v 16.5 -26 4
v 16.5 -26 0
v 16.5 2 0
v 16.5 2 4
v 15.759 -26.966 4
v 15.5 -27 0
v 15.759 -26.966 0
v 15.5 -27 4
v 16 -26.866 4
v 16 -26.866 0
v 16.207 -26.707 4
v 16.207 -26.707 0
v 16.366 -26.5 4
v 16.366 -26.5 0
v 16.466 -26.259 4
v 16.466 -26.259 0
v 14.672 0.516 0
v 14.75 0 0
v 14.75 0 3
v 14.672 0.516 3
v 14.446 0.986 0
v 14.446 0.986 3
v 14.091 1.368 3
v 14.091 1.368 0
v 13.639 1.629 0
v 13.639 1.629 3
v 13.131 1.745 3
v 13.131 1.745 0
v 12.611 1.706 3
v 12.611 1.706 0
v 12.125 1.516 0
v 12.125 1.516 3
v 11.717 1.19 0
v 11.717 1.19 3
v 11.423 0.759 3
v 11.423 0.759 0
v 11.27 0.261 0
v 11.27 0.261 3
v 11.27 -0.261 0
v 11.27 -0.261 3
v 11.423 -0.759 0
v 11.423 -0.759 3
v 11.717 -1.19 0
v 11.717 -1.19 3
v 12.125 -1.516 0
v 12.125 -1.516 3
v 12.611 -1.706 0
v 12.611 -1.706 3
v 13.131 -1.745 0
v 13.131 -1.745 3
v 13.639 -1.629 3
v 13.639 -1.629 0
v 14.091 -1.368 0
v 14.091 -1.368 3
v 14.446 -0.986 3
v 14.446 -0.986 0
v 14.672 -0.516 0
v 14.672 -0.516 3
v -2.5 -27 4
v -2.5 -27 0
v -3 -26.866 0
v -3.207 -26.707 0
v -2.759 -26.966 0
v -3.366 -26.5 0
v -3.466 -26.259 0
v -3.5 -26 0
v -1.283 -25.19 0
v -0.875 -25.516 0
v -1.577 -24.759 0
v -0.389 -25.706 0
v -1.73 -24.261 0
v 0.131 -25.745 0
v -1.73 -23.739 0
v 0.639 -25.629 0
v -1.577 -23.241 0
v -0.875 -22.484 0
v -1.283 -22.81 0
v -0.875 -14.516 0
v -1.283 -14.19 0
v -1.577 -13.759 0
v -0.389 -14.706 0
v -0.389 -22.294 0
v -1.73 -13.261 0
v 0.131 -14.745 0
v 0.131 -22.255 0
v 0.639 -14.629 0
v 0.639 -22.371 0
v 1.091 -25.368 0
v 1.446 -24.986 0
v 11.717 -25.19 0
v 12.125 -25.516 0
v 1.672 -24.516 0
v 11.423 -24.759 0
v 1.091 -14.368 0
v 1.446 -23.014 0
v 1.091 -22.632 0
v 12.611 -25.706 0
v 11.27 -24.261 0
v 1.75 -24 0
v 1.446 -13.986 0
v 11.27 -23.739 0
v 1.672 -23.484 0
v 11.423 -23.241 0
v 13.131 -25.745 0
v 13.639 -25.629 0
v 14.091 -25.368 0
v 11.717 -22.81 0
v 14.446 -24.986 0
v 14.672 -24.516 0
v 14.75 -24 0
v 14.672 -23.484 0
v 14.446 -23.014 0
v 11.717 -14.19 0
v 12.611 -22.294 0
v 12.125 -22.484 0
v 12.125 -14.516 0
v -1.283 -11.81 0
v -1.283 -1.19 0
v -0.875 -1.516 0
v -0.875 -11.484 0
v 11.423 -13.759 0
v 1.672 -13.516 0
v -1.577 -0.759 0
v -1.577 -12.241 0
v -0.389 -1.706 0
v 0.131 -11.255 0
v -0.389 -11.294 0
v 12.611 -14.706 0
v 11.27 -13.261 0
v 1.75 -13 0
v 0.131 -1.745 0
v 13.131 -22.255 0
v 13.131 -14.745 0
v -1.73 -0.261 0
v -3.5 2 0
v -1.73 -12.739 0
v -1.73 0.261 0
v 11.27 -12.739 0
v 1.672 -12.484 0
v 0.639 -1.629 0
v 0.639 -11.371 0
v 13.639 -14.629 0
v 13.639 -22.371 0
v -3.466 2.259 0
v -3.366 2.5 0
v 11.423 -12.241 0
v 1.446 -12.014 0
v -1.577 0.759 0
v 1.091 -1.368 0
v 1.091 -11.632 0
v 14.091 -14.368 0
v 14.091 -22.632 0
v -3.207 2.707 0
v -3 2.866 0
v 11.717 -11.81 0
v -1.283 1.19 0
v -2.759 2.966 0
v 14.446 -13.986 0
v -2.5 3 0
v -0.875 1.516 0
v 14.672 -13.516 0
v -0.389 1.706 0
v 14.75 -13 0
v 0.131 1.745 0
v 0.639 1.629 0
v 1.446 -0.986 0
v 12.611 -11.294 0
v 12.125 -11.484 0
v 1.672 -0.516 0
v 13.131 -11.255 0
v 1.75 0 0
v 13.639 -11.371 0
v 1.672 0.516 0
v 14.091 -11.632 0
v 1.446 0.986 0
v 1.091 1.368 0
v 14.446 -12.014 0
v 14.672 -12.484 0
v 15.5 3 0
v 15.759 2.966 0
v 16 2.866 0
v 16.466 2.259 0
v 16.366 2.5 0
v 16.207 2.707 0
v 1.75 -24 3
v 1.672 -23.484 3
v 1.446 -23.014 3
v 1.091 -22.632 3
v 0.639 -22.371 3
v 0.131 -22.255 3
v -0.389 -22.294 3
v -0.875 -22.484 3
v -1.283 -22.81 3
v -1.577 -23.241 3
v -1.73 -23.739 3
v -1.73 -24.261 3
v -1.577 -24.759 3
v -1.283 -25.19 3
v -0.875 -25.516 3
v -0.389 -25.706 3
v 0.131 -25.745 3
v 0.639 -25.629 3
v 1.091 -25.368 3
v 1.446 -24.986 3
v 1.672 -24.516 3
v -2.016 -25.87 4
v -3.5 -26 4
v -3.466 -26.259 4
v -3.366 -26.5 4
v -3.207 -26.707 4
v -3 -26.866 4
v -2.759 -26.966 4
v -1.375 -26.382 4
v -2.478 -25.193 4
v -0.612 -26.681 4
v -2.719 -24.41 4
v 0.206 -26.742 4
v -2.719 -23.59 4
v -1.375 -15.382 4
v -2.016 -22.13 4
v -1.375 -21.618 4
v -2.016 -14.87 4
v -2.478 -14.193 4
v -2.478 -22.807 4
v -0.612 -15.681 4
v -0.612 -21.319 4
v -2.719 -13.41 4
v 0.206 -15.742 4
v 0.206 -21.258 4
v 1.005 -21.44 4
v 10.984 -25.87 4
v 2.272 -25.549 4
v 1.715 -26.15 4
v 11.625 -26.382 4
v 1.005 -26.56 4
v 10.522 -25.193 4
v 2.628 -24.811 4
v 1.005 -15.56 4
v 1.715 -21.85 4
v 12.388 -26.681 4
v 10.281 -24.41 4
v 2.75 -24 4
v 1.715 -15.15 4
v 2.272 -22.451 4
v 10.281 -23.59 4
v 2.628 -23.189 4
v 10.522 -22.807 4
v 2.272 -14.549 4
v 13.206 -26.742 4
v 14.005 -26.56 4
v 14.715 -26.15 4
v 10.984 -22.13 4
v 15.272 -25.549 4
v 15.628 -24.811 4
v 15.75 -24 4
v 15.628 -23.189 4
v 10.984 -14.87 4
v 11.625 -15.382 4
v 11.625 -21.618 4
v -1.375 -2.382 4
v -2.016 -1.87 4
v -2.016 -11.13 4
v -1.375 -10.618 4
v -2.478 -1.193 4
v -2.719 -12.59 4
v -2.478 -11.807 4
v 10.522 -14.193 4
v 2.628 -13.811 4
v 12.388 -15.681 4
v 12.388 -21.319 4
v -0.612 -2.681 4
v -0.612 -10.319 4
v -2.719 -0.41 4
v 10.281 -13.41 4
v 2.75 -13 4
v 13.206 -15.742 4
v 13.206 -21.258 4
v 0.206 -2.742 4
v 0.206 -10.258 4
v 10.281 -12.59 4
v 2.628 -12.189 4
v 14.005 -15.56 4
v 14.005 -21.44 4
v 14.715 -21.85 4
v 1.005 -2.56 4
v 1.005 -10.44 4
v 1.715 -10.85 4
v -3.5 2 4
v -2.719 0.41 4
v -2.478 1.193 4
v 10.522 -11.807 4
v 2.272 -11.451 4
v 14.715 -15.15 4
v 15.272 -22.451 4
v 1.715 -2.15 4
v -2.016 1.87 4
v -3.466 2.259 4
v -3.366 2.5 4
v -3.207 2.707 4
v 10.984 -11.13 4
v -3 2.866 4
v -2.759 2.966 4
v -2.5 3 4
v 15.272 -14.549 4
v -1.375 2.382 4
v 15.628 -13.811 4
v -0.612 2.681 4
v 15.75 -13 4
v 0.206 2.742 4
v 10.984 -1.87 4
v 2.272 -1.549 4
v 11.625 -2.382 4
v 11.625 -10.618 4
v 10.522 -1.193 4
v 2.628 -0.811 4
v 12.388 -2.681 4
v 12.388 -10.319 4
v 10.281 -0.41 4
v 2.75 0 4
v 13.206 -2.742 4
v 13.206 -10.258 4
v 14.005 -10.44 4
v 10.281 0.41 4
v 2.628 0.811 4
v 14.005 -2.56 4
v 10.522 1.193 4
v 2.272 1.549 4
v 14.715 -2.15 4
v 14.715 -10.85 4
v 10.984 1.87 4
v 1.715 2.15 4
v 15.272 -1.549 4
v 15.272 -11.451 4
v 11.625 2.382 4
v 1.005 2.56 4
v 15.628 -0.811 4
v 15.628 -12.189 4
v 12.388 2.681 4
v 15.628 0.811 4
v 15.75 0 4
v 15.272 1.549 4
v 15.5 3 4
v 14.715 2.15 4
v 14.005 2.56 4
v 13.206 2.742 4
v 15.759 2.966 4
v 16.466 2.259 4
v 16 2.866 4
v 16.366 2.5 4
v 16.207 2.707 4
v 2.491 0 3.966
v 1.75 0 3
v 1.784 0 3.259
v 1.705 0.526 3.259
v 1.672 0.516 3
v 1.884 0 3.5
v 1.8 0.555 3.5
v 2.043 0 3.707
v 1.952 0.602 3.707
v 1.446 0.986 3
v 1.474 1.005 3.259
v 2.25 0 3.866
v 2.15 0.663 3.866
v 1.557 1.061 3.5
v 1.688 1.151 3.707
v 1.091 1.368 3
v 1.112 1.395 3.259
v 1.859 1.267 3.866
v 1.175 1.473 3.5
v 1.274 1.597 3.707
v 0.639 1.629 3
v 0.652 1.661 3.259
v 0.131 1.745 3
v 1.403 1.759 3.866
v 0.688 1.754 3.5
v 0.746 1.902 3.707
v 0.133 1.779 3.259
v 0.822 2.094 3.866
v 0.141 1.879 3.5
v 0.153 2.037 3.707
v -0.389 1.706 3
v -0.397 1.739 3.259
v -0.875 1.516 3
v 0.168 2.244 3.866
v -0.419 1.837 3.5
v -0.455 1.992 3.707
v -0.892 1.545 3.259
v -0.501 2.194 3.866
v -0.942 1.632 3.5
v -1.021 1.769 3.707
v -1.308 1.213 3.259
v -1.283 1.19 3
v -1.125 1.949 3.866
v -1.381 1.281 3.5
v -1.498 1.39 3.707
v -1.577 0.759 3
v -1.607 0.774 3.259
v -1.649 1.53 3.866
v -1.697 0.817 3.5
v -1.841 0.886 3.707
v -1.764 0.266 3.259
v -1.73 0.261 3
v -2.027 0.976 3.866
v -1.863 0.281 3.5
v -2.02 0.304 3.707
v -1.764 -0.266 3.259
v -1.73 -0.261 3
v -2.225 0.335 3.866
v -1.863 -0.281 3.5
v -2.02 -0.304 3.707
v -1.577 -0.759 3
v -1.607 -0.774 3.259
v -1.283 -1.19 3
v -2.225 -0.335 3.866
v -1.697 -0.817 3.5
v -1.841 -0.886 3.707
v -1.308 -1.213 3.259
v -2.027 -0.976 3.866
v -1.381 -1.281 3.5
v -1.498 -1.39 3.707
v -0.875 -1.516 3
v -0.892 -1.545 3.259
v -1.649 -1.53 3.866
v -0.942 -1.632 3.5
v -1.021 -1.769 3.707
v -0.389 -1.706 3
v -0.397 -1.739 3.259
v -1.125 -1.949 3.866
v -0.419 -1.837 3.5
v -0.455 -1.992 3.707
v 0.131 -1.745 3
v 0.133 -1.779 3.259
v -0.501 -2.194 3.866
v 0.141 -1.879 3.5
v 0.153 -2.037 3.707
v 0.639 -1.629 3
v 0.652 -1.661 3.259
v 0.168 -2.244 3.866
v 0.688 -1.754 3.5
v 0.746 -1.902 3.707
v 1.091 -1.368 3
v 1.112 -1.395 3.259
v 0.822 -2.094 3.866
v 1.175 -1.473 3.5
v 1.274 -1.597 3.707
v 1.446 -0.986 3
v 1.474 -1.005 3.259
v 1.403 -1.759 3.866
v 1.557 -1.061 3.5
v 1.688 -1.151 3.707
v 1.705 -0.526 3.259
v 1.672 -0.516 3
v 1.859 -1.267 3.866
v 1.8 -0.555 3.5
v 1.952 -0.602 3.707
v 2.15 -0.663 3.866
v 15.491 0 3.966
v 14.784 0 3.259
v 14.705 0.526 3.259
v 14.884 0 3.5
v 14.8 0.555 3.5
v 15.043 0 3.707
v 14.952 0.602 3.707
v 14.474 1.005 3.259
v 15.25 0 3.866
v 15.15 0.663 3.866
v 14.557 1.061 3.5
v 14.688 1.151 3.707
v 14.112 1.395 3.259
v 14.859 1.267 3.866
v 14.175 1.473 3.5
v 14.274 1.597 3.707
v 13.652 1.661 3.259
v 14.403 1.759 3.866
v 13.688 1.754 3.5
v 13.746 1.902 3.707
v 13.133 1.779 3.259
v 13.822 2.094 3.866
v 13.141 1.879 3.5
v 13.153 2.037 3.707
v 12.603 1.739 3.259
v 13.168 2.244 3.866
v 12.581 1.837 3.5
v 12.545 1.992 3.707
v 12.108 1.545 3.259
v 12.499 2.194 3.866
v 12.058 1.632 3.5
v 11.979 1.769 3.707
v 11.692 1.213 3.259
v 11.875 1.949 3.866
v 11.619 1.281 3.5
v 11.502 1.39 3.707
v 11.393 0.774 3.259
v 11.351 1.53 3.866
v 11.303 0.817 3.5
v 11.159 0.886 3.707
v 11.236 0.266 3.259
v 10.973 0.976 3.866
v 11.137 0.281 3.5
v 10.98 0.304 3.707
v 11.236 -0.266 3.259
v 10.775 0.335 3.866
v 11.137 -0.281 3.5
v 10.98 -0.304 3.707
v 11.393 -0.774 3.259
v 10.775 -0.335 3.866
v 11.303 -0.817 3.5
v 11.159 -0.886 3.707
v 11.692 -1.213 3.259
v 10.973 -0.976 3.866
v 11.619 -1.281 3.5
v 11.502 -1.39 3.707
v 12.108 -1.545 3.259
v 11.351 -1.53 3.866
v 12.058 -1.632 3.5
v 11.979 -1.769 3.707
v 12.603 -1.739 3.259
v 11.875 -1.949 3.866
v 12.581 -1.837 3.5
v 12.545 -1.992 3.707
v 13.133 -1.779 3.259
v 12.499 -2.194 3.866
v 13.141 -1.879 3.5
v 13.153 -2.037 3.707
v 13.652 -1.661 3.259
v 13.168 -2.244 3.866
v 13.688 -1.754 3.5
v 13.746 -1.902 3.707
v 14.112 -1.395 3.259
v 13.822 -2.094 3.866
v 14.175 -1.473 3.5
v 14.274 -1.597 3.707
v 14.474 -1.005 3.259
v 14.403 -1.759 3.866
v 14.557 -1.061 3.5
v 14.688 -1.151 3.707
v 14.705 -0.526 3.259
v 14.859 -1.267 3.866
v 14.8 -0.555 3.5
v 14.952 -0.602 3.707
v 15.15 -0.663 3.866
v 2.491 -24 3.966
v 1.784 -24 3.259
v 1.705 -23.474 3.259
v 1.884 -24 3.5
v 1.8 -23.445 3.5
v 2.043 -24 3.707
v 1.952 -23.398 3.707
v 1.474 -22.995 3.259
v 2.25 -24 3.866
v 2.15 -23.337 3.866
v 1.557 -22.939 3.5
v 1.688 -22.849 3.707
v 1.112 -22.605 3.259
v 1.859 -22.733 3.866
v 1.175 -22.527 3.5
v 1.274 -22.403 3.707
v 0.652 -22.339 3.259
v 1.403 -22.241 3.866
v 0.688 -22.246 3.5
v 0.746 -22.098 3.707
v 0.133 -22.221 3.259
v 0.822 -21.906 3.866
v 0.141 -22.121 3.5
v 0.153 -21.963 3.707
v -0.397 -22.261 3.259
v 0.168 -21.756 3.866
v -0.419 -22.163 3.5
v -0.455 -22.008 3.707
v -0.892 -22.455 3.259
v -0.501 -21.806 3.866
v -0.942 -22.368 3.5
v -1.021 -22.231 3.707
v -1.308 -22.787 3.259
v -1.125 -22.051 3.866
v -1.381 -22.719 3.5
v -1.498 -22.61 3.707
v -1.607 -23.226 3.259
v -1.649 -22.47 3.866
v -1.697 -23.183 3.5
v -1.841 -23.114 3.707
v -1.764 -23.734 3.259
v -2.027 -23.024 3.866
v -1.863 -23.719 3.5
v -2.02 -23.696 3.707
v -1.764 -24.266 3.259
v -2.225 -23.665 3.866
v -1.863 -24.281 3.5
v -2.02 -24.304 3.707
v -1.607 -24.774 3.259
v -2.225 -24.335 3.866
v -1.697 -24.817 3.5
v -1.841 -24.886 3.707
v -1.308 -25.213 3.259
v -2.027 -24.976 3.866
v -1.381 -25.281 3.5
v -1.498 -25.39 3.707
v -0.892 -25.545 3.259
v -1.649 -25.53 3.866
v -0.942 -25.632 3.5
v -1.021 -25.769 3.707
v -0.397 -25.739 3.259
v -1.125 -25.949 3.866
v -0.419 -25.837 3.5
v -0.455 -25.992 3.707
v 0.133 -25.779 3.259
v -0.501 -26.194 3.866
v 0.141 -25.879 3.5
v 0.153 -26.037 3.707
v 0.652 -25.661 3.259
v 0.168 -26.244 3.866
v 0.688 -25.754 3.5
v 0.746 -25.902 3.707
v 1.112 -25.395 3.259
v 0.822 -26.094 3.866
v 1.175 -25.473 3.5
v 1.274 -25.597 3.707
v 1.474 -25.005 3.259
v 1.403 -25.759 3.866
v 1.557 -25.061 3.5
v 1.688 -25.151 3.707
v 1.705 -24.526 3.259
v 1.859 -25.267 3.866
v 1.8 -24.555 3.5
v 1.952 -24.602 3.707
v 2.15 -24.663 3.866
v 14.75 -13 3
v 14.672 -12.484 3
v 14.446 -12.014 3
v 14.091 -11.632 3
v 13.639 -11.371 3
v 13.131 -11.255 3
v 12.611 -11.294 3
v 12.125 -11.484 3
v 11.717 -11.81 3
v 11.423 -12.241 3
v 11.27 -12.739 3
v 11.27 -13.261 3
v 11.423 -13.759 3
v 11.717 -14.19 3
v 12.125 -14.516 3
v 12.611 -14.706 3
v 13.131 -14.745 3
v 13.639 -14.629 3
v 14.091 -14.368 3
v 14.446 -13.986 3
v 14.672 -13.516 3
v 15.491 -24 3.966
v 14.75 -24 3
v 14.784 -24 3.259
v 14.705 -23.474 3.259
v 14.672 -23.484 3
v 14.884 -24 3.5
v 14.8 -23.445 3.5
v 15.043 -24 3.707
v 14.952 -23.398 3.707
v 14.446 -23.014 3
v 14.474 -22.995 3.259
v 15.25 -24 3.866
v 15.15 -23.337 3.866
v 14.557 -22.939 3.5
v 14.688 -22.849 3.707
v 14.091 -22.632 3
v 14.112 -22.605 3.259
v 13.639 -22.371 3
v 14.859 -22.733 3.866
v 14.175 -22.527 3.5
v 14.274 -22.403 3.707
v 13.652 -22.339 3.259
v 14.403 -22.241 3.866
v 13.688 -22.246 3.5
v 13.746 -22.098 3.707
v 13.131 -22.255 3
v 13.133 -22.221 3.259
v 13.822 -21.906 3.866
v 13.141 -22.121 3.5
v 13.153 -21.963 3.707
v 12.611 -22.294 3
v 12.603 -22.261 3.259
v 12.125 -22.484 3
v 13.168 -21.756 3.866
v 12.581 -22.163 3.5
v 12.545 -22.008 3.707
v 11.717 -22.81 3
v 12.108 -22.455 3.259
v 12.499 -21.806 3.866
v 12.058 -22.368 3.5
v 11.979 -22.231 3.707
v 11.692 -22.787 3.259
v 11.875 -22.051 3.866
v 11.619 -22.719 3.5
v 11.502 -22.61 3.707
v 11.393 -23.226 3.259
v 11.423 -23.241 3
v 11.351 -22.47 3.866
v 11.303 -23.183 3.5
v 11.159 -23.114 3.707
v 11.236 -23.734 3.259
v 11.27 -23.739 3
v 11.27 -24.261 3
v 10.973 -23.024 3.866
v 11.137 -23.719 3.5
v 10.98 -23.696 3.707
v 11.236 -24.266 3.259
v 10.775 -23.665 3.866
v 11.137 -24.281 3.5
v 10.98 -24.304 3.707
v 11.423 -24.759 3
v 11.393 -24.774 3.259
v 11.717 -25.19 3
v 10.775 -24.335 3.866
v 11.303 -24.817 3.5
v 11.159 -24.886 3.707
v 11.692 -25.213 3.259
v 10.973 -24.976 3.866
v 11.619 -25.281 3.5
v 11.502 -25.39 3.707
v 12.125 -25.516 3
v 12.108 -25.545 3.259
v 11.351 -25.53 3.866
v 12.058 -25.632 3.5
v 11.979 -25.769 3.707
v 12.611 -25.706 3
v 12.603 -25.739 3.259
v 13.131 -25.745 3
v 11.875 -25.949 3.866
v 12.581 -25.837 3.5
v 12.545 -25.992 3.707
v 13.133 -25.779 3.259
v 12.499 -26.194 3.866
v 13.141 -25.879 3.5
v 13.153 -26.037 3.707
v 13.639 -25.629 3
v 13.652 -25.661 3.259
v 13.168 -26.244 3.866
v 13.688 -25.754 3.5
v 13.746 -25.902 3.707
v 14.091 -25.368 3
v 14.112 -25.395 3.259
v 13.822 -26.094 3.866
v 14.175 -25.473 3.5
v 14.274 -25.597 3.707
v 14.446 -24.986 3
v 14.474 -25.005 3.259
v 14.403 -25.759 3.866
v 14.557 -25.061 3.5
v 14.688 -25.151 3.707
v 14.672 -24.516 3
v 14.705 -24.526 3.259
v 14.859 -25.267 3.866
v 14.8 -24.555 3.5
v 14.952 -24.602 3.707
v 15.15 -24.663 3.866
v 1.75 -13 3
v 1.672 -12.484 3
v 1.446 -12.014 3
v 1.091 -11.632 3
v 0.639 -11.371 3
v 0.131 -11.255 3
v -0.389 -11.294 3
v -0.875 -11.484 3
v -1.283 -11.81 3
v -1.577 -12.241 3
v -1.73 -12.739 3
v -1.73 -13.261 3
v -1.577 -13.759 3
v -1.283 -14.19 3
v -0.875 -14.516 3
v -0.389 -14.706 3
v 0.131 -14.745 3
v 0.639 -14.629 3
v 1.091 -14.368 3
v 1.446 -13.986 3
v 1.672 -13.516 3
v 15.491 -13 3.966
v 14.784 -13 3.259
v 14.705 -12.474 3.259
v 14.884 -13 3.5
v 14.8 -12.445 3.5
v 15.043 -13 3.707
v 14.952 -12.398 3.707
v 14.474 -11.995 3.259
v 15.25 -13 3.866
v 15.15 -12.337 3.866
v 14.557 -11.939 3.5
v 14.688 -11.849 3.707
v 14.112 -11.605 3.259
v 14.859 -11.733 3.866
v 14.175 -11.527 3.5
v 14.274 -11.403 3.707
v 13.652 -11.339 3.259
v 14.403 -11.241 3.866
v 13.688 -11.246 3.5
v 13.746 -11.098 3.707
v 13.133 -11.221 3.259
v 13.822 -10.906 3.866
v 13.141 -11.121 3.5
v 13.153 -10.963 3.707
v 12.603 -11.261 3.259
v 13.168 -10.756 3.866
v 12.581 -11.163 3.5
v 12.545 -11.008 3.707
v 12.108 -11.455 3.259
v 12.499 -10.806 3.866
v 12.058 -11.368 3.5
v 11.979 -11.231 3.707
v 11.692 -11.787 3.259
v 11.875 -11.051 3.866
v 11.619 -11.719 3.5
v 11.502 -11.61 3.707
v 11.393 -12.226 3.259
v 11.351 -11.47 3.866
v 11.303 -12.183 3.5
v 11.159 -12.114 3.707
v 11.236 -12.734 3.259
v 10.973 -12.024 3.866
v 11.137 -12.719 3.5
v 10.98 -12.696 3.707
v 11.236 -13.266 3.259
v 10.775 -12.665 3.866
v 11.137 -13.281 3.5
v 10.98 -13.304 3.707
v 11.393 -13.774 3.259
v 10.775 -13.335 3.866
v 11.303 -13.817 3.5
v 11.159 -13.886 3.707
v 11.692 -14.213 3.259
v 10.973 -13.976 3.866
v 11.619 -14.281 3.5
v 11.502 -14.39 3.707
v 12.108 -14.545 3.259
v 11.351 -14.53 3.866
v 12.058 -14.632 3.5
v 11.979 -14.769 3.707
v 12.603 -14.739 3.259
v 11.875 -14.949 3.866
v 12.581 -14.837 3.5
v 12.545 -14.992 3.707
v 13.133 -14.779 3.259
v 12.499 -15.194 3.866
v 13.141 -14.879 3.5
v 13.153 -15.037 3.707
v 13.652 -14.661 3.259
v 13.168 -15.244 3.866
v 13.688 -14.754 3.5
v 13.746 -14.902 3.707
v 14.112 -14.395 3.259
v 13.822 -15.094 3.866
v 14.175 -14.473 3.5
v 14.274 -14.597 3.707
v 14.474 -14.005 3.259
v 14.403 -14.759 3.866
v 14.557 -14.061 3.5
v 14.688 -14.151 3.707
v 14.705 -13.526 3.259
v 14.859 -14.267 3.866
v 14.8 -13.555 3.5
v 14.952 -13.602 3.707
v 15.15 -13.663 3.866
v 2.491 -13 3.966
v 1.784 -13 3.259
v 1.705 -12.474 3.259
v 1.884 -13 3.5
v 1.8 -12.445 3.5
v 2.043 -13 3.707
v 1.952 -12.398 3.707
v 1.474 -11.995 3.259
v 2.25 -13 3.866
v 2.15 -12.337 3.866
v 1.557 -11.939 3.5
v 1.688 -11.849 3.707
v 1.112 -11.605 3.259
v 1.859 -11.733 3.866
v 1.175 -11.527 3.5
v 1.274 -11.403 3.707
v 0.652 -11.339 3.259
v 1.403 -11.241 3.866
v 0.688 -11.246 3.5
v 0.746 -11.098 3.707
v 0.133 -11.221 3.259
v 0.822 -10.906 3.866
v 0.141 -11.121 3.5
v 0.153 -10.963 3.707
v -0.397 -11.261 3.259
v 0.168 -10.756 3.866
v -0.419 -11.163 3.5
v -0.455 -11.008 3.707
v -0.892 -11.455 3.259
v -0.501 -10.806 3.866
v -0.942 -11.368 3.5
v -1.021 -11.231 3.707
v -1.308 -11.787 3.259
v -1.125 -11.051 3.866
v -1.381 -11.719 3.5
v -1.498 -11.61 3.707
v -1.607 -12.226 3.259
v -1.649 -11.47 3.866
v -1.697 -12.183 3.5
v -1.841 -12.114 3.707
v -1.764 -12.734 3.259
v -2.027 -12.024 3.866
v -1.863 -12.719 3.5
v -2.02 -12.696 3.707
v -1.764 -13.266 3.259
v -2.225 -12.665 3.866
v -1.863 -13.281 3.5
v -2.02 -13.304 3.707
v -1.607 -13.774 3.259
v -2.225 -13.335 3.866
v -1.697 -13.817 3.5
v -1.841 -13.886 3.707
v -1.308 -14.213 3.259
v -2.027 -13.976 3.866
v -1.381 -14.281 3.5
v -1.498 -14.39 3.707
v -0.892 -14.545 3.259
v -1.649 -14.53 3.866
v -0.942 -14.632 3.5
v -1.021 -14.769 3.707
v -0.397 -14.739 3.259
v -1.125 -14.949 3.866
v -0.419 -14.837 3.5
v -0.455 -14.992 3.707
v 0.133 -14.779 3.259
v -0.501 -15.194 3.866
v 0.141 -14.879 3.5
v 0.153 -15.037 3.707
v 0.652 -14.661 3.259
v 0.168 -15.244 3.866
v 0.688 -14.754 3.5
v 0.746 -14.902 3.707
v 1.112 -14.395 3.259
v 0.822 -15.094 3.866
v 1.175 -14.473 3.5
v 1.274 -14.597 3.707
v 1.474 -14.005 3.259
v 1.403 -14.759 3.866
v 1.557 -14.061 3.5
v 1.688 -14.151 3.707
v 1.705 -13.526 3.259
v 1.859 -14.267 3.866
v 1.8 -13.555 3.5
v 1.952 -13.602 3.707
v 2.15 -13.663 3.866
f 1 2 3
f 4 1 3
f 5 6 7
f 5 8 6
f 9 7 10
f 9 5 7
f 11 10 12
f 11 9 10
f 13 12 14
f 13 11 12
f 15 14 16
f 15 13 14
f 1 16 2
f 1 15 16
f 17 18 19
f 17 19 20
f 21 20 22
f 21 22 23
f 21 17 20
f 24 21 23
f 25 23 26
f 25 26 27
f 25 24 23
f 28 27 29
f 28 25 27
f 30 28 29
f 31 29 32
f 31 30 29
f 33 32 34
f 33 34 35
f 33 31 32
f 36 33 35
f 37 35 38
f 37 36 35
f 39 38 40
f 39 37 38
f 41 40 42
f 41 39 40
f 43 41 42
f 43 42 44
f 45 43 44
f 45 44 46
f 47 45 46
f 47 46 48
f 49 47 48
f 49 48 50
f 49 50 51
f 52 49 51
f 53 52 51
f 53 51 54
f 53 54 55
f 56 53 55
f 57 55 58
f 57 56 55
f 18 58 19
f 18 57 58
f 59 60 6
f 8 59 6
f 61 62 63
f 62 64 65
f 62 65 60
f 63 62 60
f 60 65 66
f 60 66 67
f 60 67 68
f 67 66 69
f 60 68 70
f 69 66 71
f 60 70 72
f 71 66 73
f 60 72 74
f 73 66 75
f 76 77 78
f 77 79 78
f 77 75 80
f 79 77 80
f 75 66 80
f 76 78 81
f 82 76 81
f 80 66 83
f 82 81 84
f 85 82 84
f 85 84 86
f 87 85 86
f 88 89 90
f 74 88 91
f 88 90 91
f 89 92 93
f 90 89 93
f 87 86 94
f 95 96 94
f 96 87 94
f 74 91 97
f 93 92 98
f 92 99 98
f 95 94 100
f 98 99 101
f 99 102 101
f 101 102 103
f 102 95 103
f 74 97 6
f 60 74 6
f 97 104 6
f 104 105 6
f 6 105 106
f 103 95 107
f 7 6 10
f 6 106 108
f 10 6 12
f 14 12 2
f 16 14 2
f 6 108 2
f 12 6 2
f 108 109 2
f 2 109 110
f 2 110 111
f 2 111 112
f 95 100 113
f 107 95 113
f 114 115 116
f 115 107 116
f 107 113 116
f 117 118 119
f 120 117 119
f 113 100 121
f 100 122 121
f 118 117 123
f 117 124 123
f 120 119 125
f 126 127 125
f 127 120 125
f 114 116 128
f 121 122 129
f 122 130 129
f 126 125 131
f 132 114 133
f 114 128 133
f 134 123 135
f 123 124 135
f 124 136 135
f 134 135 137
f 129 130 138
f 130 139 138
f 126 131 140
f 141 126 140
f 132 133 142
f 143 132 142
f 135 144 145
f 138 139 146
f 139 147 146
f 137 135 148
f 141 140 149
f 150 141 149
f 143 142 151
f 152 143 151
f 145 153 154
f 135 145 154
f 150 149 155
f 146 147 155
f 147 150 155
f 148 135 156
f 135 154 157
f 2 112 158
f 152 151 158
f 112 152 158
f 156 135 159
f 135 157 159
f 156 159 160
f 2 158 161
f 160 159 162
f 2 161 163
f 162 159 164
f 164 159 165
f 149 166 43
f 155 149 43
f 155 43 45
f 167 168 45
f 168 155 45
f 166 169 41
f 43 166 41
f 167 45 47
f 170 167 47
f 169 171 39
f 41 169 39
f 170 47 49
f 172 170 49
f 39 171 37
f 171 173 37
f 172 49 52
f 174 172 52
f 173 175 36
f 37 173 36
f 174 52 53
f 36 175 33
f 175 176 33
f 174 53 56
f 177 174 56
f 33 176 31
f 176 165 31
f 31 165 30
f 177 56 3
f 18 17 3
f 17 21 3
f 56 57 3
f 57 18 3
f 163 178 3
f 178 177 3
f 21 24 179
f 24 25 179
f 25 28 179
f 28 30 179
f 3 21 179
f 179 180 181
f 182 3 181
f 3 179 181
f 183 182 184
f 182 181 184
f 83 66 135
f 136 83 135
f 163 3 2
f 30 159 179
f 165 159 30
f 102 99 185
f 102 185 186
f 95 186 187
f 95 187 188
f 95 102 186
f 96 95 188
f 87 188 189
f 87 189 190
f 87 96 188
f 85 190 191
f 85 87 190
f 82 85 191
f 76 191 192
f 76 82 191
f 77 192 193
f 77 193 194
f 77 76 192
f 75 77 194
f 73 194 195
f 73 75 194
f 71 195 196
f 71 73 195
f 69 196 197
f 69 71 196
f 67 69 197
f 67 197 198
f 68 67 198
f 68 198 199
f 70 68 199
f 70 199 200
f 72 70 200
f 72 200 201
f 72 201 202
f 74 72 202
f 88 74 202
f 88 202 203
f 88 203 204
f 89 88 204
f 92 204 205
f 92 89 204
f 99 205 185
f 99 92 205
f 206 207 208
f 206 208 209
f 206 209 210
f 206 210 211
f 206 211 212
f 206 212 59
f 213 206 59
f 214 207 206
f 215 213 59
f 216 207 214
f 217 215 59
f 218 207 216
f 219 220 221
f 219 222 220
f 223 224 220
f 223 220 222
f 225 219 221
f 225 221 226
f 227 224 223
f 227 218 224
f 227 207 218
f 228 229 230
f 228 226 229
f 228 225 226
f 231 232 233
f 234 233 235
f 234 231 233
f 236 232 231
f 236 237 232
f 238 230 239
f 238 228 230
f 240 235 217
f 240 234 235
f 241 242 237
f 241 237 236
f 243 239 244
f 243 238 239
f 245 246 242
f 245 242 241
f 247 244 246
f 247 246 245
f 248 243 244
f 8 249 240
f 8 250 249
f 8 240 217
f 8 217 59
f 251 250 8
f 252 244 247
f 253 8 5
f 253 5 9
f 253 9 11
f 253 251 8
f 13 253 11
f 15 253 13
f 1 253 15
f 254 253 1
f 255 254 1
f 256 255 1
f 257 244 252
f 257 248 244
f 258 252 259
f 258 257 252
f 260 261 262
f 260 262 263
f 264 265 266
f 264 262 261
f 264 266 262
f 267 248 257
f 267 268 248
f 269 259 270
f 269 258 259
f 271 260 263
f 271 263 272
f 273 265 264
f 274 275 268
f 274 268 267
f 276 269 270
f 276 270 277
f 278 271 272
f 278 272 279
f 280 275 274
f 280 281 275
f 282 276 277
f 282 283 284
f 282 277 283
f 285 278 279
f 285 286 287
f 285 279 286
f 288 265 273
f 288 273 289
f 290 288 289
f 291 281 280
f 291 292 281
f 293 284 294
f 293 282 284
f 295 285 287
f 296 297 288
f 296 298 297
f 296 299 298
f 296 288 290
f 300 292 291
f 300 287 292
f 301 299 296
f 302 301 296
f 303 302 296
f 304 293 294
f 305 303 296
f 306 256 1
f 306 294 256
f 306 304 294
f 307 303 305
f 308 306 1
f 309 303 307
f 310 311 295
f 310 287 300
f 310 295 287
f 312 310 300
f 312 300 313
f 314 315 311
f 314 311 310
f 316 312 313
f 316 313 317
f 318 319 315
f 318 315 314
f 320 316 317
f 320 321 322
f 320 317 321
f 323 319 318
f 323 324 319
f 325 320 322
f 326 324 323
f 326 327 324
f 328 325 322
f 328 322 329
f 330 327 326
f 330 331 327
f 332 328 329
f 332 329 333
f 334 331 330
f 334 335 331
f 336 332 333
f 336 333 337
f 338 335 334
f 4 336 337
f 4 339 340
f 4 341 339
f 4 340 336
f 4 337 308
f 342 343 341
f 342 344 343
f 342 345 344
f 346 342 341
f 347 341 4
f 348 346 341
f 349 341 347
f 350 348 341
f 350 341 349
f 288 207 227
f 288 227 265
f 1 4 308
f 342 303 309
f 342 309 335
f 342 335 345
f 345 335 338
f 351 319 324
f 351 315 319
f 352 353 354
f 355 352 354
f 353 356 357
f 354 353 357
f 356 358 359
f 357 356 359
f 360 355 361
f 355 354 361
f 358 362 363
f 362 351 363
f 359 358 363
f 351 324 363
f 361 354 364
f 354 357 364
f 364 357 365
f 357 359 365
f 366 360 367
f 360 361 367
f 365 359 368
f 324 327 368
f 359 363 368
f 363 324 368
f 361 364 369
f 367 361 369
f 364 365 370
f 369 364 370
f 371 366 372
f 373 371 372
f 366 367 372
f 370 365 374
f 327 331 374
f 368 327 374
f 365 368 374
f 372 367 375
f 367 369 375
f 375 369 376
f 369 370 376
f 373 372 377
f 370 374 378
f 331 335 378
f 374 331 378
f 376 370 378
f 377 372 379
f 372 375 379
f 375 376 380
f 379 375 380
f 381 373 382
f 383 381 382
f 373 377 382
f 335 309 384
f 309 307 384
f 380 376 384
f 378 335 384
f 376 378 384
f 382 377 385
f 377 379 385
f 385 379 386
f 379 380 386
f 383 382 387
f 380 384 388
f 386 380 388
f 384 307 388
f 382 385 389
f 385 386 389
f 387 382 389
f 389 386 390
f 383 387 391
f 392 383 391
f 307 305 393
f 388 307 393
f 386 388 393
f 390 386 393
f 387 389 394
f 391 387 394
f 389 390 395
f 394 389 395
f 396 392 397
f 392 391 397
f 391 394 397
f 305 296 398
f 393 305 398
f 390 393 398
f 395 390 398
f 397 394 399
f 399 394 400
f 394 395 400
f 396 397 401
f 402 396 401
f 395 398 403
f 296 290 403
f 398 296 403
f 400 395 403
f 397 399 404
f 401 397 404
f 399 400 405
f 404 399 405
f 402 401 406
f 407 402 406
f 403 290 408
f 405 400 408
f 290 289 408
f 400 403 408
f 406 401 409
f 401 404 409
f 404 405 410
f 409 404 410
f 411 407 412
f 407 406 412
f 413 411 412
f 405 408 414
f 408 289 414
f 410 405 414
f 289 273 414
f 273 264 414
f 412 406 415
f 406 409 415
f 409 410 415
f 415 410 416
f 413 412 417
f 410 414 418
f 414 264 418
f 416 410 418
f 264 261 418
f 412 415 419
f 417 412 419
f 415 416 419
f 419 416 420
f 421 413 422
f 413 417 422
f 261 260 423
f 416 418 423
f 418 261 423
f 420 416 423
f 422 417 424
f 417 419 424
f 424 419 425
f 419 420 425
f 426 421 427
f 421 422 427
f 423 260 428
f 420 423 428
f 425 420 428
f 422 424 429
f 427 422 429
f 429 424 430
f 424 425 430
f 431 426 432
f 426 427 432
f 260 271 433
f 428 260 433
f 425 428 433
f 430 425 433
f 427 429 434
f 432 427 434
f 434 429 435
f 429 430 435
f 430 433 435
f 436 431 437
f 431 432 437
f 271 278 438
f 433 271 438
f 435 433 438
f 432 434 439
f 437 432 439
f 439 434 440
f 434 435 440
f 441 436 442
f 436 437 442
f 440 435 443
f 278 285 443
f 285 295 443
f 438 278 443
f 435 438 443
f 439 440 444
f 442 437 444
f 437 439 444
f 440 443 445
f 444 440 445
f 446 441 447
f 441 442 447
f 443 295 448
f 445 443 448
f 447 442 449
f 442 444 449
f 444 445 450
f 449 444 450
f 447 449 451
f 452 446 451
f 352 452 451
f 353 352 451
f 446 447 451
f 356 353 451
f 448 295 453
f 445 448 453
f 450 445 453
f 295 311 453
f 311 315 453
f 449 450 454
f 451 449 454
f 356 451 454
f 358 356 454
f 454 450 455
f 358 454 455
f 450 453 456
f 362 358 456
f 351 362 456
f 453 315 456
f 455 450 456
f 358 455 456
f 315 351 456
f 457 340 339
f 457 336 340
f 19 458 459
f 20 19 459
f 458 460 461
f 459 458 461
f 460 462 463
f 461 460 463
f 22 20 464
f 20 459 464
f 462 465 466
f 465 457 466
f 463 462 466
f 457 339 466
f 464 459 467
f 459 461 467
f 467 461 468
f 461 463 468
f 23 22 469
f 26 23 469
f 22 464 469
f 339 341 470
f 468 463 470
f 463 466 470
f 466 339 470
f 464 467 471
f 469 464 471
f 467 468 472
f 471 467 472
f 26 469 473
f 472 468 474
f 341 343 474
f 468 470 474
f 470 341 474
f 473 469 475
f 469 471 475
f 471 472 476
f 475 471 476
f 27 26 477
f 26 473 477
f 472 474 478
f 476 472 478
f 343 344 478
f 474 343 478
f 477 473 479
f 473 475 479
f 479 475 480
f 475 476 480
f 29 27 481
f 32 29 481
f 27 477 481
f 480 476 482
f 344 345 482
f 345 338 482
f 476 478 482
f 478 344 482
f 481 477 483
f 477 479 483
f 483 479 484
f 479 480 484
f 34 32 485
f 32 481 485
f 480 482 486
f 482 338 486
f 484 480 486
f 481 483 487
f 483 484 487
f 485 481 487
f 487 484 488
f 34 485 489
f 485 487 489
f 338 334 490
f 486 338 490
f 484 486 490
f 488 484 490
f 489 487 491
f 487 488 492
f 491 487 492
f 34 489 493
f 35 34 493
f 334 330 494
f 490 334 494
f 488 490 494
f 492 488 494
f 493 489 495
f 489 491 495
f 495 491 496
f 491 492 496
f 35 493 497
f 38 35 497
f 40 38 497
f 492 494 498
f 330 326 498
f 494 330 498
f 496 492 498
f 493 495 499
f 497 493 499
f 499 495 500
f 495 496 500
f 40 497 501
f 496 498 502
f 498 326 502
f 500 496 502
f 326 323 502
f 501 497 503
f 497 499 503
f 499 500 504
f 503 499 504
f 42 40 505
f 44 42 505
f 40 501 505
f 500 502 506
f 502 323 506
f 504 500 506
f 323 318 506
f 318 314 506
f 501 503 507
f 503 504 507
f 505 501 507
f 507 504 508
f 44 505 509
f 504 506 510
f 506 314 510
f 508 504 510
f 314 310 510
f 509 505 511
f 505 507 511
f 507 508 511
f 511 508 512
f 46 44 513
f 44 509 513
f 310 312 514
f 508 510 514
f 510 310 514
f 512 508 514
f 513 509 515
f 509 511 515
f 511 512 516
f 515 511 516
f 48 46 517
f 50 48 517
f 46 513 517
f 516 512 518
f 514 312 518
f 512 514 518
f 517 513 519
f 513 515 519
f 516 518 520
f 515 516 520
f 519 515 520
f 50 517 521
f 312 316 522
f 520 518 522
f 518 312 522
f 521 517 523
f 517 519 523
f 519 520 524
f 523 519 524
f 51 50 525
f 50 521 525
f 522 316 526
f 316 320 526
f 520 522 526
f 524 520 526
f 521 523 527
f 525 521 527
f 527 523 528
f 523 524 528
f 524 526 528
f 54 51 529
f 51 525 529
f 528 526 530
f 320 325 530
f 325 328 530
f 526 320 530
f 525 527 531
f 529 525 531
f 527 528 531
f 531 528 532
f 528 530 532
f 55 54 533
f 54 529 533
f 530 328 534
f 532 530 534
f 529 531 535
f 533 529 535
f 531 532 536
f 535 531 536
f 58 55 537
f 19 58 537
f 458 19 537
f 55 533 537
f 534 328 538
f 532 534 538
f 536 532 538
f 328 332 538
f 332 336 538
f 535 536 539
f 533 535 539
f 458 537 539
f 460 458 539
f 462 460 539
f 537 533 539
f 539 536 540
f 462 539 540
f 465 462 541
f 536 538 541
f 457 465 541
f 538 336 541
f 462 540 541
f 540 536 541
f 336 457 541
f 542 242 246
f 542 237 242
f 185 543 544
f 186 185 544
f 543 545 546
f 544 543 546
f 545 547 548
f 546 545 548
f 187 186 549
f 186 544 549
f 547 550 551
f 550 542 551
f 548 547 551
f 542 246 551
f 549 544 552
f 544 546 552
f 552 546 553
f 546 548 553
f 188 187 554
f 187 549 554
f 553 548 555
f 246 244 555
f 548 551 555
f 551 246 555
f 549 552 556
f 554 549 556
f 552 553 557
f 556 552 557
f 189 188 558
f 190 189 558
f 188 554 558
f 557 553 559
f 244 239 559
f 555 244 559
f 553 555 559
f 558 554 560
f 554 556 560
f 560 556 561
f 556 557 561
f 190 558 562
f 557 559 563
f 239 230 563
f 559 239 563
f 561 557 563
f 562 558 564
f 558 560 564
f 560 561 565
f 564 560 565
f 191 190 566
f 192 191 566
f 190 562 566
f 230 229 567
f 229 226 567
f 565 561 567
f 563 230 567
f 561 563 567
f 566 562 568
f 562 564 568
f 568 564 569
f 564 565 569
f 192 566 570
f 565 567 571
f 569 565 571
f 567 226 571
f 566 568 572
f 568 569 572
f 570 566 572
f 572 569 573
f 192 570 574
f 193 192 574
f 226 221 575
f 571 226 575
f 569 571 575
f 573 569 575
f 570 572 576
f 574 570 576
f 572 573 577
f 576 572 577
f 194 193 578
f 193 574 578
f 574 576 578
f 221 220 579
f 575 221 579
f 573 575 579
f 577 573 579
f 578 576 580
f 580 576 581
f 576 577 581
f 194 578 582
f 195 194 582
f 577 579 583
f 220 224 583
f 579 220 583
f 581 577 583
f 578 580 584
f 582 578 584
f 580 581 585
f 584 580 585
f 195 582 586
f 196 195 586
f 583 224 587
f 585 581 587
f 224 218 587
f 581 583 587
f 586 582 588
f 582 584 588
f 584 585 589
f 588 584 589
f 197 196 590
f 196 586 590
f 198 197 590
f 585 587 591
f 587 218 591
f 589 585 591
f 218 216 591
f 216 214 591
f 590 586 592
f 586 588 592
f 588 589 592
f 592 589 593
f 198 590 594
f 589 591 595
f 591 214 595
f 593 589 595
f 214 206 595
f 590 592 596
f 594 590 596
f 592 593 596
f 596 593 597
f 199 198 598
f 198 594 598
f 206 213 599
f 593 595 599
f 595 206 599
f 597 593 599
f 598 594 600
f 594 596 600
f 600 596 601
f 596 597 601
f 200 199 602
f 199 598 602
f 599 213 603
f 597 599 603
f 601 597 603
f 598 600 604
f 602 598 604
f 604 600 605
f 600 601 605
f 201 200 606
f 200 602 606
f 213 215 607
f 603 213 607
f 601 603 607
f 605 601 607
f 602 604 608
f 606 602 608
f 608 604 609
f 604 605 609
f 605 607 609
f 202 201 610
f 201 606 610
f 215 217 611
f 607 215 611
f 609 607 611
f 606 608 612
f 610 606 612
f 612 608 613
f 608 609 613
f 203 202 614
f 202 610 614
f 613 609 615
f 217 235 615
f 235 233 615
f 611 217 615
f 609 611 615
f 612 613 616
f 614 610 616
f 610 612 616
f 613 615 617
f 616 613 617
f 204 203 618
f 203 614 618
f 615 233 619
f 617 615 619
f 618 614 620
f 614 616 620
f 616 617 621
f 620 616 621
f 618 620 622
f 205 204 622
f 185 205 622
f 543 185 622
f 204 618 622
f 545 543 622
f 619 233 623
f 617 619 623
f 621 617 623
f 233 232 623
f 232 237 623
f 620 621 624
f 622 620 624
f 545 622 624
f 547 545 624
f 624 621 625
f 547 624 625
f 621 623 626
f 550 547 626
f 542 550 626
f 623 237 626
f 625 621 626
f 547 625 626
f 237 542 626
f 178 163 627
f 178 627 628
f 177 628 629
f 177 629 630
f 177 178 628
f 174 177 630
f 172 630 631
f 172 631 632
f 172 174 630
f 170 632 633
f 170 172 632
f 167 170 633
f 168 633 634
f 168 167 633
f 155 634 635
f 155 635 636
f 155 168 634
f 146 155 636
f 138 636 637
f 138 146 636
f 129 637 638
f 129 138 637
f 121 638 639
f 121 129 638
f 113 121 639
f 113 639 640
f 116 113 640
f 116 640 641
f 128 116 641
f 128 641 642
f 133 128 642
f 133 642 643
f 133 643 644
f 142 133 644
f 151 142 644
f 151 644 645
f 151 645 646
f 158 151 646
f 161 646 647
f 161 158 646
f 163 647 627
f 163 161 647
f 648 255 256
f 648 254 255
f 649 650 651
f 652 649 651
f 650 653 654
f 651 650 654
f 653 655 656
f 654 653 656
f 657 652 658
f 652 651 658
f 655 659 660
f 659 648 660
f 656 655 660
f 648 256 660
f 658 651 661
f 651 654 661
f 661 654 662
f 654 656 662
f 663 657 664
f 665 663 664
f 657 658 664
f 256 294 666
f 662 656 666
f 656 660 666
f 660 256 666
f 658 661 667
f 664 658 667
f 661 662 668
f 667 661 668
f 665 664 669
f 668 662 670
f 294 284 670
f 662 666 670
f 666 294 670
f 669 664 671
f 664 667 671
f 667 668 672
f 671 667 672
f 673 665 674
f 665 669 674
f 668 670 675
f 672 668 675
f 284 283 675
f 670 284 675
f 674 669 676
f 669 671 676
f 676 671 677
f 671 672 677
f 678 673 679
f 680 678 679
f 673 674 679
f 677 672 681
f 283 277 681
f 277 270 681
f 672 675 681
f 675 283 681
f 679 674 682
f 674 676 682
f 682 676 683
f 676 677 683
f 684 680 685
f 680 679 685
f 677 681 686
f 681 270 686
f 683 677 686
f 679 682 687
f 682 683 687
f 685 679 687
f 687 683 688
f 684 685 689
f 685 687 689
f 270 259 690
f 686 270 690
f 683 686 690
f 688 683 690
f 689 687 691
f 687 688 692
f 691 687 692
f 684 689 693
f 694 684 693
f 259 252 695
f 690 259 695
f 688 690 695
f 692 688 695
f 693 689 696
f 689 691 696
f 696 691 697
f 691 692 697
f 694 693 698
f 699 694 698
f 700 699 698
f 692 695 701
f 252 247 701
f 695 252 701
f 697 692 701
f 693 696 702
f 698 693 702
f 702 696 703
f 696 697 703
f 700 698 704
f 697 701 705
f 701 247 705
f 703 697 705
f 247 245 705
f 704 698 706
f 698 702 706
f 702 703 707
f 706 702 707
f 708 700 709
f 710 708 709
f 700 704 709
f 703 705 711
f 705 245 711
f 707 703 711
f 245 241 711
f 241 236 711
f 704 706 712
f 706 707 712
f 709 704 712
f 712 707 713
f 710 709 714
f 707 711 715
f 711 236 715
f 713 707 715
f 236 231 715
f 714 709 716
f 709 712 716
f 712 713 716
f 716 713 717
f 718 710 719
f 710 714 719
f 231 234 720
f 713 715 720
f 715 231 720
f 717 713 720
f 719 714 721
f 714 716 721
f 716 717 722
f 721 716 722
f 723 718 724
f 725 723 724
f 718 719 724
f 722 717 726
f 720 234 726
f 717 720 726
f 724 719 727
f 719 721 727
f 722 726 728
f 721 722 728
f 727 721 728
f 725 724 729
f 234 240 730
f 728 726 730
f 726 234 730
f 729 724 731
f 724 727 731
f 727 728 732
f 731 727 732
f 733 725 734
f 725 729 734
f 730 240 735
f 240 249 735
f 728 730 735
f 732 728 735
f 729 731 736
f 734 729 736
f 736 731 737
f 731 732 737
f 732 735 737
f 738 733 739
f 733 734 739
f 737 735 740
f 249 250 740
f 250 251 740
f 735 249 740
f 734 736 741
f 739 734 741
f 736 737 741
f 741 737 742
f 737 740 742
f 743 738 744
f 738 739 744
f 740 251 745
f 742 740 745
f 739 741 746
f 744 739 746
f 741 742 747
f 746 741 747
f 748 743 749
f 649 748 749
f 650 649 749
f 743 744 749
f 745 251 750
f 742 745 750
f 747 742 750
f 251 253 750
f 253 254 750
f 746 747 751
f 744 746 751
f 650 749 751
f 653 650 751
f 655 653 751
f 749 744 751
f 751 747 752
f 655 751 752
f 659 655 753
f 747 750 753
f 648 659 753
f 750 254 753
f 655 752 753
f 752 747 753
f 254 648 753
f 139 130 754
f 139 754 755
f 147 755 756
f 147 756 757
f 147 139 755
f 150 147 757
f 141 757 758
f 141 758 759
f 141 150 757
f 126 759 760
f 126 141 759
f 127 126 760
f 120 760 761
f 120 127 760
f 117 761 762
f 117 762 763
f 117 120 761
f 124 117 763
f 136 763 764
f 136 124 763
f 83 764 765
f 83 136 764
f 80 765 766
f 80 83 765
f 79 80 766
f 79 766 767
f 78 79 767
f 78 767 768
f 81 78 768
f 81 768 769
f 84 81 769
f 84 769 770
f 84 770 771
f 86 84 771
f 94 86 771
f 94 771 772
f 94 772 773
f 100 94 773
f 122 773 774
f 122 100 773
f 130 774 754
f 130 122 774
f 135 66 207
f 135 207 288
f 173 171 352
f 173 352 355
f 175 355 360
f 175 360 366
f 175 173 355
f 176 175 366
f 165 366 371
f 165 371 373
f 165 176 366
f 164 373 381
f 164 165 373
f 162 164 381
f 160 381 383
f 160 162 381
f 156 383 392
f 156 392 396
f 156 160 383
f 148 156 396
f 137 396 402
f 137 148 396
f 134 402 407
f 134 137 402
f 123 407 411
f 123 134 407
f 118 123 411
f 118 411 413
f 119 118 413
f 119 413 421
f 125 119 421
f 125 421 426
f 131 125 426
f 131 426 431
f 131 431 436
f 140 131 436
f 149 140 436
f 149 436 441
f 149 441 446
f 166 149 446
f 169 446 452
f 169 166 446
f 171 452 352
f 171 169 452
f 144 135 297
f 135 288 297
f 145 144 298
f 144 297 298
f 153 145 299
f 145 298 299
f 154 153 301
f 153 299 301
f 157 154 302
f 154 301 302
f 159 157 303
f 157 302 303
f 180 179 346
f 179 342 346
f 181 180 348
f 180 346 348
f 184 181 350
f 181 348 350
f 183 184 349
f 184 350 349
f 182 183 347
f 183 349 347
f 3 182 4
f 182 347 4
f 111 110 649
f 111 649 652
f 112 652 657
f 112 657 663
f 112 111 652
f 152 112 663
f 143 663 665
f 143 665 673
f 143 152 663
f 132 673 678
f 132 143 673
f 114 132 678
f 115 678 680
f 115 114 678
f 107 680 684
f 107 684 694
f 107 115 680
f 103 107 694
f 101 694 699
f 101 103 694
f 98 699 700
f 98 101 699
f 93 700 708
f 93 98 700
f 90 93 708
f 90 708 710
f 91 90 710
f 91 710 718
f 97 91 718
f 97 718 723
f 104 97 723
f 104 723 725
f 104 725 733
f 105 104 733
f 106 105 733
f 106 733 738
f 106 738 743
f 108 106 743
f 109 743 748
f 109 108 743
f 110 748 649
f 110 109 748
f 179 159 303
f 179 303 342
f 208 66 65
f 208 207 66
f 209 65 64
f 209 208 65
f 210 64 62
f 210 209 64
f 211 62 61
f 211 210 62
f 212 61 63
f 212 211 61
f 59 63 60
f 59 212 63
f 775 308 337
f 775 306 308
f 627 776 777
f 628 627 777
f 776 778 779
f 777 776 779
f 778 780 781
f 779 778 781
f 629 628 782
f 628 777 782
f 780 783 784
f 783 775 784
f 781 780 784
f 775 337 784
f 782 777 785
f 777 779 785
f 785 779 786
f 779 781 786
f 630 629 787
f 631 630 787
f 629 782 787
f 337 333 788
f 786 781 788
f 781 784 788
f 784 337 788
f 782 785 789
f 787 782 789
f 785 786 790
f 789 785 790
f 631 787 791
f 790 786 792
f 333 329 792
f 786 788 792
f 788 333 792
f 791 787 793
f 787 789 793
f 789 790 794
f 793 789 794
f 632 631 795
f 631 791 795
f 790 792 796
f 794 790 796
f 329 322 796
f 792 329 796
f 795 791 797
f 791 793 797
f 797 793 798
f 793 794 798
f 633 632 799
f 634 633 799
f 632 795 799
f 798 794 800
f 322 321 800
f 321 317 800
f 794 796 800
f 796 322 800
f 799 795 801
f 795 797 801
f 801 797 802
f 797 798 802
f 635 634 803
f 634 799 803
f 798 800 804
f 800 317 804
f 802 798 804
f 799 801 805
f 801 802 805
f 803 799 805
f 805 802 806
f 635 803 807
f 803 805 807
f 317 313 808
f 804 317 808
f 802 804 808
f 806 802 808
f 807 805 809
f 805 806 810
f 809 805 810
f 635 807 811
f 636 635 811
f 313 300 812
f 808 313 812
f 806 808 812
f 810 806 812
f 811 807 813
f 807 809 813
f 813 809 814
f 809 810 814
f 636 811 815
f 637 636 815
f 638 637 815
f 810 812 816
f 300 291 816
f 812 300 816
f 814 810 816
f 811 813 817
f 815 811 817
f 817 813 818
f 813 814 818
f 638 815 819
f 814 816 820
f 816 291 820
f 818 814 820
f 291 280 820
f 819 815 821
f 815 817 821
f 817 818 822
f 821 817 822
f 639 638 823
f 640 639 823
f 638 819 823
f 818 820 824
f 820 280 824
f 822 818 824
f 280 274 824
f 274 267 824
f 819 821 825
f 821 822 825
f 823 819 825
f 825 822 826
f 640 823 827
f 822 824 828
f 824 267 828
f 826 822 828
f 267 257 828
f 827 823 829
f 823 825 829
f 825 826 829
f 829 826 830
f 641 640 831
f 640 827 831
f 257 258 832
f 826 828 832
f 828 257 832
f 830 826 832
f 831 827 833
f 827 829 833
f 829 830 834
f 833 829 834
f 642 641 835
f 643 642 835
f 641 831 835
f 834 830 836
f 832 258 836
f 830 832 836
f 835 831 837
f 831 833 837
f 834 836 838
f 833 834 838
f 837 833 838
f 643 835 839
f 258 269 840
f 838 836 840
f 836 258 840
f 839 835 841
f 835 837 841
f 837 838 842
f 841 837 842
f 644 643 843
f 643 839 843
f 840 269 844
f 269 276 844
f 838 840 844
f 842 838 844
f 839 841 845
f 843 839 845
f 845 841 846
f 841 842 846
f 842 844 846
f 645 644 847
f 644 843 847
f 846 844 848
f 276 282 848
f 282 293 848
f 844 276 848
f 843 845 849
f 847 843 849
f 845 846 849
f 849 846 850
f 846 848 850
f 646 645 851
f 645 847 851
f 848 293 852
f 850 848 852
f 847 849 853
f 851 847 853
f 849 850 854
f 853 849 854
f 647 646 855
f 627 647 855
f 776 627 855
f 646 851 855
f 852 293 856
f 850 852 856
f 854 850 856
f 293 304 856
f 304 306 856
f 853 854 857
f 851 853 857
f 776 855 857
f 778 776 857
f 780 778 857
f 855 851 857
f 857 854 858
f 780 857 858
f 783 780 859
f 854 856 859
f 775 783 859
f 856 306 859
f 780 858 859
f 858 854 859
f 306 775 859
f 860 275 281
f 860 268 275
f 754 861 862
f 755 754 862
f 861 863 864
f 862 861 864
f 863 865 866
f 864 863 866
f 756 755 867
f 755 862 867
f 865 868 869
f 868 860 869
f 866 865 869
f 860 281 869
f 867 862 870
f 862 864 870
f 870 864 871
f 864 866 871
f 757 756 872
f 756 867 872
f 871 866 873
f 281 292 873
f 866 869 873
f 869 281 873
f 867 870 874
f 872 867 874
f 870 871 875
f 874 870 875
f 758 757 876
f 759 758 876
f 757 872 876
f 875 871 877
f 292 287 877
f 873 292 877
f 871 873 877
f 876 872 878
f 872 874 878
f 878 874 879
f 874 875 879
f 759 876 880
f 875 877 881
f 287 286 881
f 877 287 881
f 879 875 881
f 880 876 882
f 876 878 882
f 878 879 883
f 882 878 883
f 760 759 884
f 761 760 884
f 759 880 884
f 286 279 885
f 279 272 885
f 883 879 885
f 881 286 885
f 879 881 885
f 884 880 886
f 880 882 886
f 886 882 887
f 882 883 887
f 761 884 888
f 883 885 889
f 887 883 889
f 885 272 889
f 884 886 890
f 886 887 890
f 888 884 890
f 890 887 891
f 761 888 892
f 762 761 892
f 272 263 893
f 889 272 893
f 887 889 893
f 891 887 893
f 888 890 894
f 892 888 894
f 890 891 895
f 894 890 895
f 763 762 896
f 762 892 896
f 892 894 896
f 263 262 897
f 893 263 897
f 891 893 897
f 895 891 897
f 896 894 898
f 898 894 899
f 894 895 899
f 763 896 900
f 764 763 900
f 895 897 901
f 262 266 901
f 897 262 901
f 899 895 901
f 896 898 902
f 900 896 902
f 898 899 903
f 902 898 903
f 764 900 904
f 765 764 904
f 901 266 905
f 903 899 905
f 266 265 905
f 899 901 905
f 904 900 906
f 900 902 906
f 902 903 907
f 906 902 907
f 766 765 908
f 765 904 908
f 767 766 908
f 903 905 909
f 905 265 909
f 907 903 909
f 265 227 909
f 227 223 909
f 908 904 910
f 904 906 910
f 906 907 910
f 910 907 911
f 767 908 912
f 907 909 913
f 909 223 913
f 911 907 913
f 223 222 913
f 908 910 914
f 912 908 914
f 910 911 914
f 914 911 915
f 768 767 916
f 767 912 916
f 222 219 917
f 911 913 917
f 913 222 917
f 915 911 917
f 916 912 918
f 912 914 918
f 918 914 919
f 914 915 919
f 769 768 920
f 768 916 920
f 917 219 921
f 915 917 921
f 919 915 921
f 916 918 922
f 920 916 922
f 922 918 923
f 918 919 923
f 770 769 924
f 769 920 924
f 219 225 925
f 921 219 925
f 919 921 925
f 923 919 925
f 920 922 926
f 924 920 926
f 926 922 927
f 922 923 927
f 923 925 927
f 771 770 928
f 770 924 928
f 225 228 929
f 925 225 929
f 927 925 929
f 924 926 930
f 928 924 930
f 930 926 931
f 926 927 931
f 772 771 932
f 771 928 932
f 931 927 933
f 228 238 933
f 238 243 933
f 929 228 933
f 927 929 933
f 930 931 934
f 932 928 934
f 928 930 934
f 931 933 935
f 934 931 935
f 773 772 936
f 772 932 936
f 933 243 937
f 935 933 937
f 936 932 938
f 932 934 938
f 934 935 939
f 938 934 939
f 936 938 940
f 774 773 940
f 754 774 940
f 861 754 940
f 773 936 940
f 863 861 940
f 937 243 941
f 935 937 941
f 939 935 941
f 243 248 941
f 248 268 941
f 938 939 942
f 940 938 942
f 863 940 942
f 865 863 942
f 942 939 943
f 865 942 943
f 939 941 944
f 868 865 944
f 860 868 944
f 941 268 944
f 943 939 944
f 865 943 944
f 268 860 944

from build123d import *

# Parameters (mm, degrees)
F0_W     = 20
F0_H     = 30
F0_R     = 1.75
F1_DEPTH = 4
F2_R     = 1
F3_R     = 1


with BuildPart() as f1:
    # F0 (on Top) → F1 (new body)
    with BuildSketch(Plane.XY):
        with Locations((6.5, -12)):
            Rectangle(F0_W, F0_H)
        with Locations((0, -24)):
            Circle(F0_R, mode=Mode.SUBTRACT)
        with Locations((0, -13)):
            Circle(F0_R, mode=Mode.SUBTRACT)
        with Locations((13, -24)):
            Circle(F0_R, mode=Mode.SUBTRACT)
        with Locations((13, -13)):
            Circle(F0_R, mode=Mode.SUBTRACT)
        Circle(F0_R, mode=Mode.SUBTRACT)
        with Locations((13, 0)):
            Circle(F0_R, mode=Mode.SUBTRACT)
    extrude(amount=F1_DEPTH)

    # F2
    f2_edges = [f1.edges().sort_by_distance(p)[0] for p in [
        (-1.75, 0, 4),
        (11.25, 0, 4),
        (11.25, -13, 4),
        (-1.75, -13, 4),
        (-1.75, -24, 4),
        (11.25, -24, 4),
    ]]
    fillet(f2_edges, radius=F2_R)

    # F3
    f3_edges = [f1.edges().sort_by_distance(p)[0] for p in [
        (-3.5, 3, 2),
        (-3.5, -27, 2),
        (16.5, -27, 2),
        (16.5, 3, 2),
    ]]
    fillet(f3_edges, radius=F3_R)


solid = f1.part
